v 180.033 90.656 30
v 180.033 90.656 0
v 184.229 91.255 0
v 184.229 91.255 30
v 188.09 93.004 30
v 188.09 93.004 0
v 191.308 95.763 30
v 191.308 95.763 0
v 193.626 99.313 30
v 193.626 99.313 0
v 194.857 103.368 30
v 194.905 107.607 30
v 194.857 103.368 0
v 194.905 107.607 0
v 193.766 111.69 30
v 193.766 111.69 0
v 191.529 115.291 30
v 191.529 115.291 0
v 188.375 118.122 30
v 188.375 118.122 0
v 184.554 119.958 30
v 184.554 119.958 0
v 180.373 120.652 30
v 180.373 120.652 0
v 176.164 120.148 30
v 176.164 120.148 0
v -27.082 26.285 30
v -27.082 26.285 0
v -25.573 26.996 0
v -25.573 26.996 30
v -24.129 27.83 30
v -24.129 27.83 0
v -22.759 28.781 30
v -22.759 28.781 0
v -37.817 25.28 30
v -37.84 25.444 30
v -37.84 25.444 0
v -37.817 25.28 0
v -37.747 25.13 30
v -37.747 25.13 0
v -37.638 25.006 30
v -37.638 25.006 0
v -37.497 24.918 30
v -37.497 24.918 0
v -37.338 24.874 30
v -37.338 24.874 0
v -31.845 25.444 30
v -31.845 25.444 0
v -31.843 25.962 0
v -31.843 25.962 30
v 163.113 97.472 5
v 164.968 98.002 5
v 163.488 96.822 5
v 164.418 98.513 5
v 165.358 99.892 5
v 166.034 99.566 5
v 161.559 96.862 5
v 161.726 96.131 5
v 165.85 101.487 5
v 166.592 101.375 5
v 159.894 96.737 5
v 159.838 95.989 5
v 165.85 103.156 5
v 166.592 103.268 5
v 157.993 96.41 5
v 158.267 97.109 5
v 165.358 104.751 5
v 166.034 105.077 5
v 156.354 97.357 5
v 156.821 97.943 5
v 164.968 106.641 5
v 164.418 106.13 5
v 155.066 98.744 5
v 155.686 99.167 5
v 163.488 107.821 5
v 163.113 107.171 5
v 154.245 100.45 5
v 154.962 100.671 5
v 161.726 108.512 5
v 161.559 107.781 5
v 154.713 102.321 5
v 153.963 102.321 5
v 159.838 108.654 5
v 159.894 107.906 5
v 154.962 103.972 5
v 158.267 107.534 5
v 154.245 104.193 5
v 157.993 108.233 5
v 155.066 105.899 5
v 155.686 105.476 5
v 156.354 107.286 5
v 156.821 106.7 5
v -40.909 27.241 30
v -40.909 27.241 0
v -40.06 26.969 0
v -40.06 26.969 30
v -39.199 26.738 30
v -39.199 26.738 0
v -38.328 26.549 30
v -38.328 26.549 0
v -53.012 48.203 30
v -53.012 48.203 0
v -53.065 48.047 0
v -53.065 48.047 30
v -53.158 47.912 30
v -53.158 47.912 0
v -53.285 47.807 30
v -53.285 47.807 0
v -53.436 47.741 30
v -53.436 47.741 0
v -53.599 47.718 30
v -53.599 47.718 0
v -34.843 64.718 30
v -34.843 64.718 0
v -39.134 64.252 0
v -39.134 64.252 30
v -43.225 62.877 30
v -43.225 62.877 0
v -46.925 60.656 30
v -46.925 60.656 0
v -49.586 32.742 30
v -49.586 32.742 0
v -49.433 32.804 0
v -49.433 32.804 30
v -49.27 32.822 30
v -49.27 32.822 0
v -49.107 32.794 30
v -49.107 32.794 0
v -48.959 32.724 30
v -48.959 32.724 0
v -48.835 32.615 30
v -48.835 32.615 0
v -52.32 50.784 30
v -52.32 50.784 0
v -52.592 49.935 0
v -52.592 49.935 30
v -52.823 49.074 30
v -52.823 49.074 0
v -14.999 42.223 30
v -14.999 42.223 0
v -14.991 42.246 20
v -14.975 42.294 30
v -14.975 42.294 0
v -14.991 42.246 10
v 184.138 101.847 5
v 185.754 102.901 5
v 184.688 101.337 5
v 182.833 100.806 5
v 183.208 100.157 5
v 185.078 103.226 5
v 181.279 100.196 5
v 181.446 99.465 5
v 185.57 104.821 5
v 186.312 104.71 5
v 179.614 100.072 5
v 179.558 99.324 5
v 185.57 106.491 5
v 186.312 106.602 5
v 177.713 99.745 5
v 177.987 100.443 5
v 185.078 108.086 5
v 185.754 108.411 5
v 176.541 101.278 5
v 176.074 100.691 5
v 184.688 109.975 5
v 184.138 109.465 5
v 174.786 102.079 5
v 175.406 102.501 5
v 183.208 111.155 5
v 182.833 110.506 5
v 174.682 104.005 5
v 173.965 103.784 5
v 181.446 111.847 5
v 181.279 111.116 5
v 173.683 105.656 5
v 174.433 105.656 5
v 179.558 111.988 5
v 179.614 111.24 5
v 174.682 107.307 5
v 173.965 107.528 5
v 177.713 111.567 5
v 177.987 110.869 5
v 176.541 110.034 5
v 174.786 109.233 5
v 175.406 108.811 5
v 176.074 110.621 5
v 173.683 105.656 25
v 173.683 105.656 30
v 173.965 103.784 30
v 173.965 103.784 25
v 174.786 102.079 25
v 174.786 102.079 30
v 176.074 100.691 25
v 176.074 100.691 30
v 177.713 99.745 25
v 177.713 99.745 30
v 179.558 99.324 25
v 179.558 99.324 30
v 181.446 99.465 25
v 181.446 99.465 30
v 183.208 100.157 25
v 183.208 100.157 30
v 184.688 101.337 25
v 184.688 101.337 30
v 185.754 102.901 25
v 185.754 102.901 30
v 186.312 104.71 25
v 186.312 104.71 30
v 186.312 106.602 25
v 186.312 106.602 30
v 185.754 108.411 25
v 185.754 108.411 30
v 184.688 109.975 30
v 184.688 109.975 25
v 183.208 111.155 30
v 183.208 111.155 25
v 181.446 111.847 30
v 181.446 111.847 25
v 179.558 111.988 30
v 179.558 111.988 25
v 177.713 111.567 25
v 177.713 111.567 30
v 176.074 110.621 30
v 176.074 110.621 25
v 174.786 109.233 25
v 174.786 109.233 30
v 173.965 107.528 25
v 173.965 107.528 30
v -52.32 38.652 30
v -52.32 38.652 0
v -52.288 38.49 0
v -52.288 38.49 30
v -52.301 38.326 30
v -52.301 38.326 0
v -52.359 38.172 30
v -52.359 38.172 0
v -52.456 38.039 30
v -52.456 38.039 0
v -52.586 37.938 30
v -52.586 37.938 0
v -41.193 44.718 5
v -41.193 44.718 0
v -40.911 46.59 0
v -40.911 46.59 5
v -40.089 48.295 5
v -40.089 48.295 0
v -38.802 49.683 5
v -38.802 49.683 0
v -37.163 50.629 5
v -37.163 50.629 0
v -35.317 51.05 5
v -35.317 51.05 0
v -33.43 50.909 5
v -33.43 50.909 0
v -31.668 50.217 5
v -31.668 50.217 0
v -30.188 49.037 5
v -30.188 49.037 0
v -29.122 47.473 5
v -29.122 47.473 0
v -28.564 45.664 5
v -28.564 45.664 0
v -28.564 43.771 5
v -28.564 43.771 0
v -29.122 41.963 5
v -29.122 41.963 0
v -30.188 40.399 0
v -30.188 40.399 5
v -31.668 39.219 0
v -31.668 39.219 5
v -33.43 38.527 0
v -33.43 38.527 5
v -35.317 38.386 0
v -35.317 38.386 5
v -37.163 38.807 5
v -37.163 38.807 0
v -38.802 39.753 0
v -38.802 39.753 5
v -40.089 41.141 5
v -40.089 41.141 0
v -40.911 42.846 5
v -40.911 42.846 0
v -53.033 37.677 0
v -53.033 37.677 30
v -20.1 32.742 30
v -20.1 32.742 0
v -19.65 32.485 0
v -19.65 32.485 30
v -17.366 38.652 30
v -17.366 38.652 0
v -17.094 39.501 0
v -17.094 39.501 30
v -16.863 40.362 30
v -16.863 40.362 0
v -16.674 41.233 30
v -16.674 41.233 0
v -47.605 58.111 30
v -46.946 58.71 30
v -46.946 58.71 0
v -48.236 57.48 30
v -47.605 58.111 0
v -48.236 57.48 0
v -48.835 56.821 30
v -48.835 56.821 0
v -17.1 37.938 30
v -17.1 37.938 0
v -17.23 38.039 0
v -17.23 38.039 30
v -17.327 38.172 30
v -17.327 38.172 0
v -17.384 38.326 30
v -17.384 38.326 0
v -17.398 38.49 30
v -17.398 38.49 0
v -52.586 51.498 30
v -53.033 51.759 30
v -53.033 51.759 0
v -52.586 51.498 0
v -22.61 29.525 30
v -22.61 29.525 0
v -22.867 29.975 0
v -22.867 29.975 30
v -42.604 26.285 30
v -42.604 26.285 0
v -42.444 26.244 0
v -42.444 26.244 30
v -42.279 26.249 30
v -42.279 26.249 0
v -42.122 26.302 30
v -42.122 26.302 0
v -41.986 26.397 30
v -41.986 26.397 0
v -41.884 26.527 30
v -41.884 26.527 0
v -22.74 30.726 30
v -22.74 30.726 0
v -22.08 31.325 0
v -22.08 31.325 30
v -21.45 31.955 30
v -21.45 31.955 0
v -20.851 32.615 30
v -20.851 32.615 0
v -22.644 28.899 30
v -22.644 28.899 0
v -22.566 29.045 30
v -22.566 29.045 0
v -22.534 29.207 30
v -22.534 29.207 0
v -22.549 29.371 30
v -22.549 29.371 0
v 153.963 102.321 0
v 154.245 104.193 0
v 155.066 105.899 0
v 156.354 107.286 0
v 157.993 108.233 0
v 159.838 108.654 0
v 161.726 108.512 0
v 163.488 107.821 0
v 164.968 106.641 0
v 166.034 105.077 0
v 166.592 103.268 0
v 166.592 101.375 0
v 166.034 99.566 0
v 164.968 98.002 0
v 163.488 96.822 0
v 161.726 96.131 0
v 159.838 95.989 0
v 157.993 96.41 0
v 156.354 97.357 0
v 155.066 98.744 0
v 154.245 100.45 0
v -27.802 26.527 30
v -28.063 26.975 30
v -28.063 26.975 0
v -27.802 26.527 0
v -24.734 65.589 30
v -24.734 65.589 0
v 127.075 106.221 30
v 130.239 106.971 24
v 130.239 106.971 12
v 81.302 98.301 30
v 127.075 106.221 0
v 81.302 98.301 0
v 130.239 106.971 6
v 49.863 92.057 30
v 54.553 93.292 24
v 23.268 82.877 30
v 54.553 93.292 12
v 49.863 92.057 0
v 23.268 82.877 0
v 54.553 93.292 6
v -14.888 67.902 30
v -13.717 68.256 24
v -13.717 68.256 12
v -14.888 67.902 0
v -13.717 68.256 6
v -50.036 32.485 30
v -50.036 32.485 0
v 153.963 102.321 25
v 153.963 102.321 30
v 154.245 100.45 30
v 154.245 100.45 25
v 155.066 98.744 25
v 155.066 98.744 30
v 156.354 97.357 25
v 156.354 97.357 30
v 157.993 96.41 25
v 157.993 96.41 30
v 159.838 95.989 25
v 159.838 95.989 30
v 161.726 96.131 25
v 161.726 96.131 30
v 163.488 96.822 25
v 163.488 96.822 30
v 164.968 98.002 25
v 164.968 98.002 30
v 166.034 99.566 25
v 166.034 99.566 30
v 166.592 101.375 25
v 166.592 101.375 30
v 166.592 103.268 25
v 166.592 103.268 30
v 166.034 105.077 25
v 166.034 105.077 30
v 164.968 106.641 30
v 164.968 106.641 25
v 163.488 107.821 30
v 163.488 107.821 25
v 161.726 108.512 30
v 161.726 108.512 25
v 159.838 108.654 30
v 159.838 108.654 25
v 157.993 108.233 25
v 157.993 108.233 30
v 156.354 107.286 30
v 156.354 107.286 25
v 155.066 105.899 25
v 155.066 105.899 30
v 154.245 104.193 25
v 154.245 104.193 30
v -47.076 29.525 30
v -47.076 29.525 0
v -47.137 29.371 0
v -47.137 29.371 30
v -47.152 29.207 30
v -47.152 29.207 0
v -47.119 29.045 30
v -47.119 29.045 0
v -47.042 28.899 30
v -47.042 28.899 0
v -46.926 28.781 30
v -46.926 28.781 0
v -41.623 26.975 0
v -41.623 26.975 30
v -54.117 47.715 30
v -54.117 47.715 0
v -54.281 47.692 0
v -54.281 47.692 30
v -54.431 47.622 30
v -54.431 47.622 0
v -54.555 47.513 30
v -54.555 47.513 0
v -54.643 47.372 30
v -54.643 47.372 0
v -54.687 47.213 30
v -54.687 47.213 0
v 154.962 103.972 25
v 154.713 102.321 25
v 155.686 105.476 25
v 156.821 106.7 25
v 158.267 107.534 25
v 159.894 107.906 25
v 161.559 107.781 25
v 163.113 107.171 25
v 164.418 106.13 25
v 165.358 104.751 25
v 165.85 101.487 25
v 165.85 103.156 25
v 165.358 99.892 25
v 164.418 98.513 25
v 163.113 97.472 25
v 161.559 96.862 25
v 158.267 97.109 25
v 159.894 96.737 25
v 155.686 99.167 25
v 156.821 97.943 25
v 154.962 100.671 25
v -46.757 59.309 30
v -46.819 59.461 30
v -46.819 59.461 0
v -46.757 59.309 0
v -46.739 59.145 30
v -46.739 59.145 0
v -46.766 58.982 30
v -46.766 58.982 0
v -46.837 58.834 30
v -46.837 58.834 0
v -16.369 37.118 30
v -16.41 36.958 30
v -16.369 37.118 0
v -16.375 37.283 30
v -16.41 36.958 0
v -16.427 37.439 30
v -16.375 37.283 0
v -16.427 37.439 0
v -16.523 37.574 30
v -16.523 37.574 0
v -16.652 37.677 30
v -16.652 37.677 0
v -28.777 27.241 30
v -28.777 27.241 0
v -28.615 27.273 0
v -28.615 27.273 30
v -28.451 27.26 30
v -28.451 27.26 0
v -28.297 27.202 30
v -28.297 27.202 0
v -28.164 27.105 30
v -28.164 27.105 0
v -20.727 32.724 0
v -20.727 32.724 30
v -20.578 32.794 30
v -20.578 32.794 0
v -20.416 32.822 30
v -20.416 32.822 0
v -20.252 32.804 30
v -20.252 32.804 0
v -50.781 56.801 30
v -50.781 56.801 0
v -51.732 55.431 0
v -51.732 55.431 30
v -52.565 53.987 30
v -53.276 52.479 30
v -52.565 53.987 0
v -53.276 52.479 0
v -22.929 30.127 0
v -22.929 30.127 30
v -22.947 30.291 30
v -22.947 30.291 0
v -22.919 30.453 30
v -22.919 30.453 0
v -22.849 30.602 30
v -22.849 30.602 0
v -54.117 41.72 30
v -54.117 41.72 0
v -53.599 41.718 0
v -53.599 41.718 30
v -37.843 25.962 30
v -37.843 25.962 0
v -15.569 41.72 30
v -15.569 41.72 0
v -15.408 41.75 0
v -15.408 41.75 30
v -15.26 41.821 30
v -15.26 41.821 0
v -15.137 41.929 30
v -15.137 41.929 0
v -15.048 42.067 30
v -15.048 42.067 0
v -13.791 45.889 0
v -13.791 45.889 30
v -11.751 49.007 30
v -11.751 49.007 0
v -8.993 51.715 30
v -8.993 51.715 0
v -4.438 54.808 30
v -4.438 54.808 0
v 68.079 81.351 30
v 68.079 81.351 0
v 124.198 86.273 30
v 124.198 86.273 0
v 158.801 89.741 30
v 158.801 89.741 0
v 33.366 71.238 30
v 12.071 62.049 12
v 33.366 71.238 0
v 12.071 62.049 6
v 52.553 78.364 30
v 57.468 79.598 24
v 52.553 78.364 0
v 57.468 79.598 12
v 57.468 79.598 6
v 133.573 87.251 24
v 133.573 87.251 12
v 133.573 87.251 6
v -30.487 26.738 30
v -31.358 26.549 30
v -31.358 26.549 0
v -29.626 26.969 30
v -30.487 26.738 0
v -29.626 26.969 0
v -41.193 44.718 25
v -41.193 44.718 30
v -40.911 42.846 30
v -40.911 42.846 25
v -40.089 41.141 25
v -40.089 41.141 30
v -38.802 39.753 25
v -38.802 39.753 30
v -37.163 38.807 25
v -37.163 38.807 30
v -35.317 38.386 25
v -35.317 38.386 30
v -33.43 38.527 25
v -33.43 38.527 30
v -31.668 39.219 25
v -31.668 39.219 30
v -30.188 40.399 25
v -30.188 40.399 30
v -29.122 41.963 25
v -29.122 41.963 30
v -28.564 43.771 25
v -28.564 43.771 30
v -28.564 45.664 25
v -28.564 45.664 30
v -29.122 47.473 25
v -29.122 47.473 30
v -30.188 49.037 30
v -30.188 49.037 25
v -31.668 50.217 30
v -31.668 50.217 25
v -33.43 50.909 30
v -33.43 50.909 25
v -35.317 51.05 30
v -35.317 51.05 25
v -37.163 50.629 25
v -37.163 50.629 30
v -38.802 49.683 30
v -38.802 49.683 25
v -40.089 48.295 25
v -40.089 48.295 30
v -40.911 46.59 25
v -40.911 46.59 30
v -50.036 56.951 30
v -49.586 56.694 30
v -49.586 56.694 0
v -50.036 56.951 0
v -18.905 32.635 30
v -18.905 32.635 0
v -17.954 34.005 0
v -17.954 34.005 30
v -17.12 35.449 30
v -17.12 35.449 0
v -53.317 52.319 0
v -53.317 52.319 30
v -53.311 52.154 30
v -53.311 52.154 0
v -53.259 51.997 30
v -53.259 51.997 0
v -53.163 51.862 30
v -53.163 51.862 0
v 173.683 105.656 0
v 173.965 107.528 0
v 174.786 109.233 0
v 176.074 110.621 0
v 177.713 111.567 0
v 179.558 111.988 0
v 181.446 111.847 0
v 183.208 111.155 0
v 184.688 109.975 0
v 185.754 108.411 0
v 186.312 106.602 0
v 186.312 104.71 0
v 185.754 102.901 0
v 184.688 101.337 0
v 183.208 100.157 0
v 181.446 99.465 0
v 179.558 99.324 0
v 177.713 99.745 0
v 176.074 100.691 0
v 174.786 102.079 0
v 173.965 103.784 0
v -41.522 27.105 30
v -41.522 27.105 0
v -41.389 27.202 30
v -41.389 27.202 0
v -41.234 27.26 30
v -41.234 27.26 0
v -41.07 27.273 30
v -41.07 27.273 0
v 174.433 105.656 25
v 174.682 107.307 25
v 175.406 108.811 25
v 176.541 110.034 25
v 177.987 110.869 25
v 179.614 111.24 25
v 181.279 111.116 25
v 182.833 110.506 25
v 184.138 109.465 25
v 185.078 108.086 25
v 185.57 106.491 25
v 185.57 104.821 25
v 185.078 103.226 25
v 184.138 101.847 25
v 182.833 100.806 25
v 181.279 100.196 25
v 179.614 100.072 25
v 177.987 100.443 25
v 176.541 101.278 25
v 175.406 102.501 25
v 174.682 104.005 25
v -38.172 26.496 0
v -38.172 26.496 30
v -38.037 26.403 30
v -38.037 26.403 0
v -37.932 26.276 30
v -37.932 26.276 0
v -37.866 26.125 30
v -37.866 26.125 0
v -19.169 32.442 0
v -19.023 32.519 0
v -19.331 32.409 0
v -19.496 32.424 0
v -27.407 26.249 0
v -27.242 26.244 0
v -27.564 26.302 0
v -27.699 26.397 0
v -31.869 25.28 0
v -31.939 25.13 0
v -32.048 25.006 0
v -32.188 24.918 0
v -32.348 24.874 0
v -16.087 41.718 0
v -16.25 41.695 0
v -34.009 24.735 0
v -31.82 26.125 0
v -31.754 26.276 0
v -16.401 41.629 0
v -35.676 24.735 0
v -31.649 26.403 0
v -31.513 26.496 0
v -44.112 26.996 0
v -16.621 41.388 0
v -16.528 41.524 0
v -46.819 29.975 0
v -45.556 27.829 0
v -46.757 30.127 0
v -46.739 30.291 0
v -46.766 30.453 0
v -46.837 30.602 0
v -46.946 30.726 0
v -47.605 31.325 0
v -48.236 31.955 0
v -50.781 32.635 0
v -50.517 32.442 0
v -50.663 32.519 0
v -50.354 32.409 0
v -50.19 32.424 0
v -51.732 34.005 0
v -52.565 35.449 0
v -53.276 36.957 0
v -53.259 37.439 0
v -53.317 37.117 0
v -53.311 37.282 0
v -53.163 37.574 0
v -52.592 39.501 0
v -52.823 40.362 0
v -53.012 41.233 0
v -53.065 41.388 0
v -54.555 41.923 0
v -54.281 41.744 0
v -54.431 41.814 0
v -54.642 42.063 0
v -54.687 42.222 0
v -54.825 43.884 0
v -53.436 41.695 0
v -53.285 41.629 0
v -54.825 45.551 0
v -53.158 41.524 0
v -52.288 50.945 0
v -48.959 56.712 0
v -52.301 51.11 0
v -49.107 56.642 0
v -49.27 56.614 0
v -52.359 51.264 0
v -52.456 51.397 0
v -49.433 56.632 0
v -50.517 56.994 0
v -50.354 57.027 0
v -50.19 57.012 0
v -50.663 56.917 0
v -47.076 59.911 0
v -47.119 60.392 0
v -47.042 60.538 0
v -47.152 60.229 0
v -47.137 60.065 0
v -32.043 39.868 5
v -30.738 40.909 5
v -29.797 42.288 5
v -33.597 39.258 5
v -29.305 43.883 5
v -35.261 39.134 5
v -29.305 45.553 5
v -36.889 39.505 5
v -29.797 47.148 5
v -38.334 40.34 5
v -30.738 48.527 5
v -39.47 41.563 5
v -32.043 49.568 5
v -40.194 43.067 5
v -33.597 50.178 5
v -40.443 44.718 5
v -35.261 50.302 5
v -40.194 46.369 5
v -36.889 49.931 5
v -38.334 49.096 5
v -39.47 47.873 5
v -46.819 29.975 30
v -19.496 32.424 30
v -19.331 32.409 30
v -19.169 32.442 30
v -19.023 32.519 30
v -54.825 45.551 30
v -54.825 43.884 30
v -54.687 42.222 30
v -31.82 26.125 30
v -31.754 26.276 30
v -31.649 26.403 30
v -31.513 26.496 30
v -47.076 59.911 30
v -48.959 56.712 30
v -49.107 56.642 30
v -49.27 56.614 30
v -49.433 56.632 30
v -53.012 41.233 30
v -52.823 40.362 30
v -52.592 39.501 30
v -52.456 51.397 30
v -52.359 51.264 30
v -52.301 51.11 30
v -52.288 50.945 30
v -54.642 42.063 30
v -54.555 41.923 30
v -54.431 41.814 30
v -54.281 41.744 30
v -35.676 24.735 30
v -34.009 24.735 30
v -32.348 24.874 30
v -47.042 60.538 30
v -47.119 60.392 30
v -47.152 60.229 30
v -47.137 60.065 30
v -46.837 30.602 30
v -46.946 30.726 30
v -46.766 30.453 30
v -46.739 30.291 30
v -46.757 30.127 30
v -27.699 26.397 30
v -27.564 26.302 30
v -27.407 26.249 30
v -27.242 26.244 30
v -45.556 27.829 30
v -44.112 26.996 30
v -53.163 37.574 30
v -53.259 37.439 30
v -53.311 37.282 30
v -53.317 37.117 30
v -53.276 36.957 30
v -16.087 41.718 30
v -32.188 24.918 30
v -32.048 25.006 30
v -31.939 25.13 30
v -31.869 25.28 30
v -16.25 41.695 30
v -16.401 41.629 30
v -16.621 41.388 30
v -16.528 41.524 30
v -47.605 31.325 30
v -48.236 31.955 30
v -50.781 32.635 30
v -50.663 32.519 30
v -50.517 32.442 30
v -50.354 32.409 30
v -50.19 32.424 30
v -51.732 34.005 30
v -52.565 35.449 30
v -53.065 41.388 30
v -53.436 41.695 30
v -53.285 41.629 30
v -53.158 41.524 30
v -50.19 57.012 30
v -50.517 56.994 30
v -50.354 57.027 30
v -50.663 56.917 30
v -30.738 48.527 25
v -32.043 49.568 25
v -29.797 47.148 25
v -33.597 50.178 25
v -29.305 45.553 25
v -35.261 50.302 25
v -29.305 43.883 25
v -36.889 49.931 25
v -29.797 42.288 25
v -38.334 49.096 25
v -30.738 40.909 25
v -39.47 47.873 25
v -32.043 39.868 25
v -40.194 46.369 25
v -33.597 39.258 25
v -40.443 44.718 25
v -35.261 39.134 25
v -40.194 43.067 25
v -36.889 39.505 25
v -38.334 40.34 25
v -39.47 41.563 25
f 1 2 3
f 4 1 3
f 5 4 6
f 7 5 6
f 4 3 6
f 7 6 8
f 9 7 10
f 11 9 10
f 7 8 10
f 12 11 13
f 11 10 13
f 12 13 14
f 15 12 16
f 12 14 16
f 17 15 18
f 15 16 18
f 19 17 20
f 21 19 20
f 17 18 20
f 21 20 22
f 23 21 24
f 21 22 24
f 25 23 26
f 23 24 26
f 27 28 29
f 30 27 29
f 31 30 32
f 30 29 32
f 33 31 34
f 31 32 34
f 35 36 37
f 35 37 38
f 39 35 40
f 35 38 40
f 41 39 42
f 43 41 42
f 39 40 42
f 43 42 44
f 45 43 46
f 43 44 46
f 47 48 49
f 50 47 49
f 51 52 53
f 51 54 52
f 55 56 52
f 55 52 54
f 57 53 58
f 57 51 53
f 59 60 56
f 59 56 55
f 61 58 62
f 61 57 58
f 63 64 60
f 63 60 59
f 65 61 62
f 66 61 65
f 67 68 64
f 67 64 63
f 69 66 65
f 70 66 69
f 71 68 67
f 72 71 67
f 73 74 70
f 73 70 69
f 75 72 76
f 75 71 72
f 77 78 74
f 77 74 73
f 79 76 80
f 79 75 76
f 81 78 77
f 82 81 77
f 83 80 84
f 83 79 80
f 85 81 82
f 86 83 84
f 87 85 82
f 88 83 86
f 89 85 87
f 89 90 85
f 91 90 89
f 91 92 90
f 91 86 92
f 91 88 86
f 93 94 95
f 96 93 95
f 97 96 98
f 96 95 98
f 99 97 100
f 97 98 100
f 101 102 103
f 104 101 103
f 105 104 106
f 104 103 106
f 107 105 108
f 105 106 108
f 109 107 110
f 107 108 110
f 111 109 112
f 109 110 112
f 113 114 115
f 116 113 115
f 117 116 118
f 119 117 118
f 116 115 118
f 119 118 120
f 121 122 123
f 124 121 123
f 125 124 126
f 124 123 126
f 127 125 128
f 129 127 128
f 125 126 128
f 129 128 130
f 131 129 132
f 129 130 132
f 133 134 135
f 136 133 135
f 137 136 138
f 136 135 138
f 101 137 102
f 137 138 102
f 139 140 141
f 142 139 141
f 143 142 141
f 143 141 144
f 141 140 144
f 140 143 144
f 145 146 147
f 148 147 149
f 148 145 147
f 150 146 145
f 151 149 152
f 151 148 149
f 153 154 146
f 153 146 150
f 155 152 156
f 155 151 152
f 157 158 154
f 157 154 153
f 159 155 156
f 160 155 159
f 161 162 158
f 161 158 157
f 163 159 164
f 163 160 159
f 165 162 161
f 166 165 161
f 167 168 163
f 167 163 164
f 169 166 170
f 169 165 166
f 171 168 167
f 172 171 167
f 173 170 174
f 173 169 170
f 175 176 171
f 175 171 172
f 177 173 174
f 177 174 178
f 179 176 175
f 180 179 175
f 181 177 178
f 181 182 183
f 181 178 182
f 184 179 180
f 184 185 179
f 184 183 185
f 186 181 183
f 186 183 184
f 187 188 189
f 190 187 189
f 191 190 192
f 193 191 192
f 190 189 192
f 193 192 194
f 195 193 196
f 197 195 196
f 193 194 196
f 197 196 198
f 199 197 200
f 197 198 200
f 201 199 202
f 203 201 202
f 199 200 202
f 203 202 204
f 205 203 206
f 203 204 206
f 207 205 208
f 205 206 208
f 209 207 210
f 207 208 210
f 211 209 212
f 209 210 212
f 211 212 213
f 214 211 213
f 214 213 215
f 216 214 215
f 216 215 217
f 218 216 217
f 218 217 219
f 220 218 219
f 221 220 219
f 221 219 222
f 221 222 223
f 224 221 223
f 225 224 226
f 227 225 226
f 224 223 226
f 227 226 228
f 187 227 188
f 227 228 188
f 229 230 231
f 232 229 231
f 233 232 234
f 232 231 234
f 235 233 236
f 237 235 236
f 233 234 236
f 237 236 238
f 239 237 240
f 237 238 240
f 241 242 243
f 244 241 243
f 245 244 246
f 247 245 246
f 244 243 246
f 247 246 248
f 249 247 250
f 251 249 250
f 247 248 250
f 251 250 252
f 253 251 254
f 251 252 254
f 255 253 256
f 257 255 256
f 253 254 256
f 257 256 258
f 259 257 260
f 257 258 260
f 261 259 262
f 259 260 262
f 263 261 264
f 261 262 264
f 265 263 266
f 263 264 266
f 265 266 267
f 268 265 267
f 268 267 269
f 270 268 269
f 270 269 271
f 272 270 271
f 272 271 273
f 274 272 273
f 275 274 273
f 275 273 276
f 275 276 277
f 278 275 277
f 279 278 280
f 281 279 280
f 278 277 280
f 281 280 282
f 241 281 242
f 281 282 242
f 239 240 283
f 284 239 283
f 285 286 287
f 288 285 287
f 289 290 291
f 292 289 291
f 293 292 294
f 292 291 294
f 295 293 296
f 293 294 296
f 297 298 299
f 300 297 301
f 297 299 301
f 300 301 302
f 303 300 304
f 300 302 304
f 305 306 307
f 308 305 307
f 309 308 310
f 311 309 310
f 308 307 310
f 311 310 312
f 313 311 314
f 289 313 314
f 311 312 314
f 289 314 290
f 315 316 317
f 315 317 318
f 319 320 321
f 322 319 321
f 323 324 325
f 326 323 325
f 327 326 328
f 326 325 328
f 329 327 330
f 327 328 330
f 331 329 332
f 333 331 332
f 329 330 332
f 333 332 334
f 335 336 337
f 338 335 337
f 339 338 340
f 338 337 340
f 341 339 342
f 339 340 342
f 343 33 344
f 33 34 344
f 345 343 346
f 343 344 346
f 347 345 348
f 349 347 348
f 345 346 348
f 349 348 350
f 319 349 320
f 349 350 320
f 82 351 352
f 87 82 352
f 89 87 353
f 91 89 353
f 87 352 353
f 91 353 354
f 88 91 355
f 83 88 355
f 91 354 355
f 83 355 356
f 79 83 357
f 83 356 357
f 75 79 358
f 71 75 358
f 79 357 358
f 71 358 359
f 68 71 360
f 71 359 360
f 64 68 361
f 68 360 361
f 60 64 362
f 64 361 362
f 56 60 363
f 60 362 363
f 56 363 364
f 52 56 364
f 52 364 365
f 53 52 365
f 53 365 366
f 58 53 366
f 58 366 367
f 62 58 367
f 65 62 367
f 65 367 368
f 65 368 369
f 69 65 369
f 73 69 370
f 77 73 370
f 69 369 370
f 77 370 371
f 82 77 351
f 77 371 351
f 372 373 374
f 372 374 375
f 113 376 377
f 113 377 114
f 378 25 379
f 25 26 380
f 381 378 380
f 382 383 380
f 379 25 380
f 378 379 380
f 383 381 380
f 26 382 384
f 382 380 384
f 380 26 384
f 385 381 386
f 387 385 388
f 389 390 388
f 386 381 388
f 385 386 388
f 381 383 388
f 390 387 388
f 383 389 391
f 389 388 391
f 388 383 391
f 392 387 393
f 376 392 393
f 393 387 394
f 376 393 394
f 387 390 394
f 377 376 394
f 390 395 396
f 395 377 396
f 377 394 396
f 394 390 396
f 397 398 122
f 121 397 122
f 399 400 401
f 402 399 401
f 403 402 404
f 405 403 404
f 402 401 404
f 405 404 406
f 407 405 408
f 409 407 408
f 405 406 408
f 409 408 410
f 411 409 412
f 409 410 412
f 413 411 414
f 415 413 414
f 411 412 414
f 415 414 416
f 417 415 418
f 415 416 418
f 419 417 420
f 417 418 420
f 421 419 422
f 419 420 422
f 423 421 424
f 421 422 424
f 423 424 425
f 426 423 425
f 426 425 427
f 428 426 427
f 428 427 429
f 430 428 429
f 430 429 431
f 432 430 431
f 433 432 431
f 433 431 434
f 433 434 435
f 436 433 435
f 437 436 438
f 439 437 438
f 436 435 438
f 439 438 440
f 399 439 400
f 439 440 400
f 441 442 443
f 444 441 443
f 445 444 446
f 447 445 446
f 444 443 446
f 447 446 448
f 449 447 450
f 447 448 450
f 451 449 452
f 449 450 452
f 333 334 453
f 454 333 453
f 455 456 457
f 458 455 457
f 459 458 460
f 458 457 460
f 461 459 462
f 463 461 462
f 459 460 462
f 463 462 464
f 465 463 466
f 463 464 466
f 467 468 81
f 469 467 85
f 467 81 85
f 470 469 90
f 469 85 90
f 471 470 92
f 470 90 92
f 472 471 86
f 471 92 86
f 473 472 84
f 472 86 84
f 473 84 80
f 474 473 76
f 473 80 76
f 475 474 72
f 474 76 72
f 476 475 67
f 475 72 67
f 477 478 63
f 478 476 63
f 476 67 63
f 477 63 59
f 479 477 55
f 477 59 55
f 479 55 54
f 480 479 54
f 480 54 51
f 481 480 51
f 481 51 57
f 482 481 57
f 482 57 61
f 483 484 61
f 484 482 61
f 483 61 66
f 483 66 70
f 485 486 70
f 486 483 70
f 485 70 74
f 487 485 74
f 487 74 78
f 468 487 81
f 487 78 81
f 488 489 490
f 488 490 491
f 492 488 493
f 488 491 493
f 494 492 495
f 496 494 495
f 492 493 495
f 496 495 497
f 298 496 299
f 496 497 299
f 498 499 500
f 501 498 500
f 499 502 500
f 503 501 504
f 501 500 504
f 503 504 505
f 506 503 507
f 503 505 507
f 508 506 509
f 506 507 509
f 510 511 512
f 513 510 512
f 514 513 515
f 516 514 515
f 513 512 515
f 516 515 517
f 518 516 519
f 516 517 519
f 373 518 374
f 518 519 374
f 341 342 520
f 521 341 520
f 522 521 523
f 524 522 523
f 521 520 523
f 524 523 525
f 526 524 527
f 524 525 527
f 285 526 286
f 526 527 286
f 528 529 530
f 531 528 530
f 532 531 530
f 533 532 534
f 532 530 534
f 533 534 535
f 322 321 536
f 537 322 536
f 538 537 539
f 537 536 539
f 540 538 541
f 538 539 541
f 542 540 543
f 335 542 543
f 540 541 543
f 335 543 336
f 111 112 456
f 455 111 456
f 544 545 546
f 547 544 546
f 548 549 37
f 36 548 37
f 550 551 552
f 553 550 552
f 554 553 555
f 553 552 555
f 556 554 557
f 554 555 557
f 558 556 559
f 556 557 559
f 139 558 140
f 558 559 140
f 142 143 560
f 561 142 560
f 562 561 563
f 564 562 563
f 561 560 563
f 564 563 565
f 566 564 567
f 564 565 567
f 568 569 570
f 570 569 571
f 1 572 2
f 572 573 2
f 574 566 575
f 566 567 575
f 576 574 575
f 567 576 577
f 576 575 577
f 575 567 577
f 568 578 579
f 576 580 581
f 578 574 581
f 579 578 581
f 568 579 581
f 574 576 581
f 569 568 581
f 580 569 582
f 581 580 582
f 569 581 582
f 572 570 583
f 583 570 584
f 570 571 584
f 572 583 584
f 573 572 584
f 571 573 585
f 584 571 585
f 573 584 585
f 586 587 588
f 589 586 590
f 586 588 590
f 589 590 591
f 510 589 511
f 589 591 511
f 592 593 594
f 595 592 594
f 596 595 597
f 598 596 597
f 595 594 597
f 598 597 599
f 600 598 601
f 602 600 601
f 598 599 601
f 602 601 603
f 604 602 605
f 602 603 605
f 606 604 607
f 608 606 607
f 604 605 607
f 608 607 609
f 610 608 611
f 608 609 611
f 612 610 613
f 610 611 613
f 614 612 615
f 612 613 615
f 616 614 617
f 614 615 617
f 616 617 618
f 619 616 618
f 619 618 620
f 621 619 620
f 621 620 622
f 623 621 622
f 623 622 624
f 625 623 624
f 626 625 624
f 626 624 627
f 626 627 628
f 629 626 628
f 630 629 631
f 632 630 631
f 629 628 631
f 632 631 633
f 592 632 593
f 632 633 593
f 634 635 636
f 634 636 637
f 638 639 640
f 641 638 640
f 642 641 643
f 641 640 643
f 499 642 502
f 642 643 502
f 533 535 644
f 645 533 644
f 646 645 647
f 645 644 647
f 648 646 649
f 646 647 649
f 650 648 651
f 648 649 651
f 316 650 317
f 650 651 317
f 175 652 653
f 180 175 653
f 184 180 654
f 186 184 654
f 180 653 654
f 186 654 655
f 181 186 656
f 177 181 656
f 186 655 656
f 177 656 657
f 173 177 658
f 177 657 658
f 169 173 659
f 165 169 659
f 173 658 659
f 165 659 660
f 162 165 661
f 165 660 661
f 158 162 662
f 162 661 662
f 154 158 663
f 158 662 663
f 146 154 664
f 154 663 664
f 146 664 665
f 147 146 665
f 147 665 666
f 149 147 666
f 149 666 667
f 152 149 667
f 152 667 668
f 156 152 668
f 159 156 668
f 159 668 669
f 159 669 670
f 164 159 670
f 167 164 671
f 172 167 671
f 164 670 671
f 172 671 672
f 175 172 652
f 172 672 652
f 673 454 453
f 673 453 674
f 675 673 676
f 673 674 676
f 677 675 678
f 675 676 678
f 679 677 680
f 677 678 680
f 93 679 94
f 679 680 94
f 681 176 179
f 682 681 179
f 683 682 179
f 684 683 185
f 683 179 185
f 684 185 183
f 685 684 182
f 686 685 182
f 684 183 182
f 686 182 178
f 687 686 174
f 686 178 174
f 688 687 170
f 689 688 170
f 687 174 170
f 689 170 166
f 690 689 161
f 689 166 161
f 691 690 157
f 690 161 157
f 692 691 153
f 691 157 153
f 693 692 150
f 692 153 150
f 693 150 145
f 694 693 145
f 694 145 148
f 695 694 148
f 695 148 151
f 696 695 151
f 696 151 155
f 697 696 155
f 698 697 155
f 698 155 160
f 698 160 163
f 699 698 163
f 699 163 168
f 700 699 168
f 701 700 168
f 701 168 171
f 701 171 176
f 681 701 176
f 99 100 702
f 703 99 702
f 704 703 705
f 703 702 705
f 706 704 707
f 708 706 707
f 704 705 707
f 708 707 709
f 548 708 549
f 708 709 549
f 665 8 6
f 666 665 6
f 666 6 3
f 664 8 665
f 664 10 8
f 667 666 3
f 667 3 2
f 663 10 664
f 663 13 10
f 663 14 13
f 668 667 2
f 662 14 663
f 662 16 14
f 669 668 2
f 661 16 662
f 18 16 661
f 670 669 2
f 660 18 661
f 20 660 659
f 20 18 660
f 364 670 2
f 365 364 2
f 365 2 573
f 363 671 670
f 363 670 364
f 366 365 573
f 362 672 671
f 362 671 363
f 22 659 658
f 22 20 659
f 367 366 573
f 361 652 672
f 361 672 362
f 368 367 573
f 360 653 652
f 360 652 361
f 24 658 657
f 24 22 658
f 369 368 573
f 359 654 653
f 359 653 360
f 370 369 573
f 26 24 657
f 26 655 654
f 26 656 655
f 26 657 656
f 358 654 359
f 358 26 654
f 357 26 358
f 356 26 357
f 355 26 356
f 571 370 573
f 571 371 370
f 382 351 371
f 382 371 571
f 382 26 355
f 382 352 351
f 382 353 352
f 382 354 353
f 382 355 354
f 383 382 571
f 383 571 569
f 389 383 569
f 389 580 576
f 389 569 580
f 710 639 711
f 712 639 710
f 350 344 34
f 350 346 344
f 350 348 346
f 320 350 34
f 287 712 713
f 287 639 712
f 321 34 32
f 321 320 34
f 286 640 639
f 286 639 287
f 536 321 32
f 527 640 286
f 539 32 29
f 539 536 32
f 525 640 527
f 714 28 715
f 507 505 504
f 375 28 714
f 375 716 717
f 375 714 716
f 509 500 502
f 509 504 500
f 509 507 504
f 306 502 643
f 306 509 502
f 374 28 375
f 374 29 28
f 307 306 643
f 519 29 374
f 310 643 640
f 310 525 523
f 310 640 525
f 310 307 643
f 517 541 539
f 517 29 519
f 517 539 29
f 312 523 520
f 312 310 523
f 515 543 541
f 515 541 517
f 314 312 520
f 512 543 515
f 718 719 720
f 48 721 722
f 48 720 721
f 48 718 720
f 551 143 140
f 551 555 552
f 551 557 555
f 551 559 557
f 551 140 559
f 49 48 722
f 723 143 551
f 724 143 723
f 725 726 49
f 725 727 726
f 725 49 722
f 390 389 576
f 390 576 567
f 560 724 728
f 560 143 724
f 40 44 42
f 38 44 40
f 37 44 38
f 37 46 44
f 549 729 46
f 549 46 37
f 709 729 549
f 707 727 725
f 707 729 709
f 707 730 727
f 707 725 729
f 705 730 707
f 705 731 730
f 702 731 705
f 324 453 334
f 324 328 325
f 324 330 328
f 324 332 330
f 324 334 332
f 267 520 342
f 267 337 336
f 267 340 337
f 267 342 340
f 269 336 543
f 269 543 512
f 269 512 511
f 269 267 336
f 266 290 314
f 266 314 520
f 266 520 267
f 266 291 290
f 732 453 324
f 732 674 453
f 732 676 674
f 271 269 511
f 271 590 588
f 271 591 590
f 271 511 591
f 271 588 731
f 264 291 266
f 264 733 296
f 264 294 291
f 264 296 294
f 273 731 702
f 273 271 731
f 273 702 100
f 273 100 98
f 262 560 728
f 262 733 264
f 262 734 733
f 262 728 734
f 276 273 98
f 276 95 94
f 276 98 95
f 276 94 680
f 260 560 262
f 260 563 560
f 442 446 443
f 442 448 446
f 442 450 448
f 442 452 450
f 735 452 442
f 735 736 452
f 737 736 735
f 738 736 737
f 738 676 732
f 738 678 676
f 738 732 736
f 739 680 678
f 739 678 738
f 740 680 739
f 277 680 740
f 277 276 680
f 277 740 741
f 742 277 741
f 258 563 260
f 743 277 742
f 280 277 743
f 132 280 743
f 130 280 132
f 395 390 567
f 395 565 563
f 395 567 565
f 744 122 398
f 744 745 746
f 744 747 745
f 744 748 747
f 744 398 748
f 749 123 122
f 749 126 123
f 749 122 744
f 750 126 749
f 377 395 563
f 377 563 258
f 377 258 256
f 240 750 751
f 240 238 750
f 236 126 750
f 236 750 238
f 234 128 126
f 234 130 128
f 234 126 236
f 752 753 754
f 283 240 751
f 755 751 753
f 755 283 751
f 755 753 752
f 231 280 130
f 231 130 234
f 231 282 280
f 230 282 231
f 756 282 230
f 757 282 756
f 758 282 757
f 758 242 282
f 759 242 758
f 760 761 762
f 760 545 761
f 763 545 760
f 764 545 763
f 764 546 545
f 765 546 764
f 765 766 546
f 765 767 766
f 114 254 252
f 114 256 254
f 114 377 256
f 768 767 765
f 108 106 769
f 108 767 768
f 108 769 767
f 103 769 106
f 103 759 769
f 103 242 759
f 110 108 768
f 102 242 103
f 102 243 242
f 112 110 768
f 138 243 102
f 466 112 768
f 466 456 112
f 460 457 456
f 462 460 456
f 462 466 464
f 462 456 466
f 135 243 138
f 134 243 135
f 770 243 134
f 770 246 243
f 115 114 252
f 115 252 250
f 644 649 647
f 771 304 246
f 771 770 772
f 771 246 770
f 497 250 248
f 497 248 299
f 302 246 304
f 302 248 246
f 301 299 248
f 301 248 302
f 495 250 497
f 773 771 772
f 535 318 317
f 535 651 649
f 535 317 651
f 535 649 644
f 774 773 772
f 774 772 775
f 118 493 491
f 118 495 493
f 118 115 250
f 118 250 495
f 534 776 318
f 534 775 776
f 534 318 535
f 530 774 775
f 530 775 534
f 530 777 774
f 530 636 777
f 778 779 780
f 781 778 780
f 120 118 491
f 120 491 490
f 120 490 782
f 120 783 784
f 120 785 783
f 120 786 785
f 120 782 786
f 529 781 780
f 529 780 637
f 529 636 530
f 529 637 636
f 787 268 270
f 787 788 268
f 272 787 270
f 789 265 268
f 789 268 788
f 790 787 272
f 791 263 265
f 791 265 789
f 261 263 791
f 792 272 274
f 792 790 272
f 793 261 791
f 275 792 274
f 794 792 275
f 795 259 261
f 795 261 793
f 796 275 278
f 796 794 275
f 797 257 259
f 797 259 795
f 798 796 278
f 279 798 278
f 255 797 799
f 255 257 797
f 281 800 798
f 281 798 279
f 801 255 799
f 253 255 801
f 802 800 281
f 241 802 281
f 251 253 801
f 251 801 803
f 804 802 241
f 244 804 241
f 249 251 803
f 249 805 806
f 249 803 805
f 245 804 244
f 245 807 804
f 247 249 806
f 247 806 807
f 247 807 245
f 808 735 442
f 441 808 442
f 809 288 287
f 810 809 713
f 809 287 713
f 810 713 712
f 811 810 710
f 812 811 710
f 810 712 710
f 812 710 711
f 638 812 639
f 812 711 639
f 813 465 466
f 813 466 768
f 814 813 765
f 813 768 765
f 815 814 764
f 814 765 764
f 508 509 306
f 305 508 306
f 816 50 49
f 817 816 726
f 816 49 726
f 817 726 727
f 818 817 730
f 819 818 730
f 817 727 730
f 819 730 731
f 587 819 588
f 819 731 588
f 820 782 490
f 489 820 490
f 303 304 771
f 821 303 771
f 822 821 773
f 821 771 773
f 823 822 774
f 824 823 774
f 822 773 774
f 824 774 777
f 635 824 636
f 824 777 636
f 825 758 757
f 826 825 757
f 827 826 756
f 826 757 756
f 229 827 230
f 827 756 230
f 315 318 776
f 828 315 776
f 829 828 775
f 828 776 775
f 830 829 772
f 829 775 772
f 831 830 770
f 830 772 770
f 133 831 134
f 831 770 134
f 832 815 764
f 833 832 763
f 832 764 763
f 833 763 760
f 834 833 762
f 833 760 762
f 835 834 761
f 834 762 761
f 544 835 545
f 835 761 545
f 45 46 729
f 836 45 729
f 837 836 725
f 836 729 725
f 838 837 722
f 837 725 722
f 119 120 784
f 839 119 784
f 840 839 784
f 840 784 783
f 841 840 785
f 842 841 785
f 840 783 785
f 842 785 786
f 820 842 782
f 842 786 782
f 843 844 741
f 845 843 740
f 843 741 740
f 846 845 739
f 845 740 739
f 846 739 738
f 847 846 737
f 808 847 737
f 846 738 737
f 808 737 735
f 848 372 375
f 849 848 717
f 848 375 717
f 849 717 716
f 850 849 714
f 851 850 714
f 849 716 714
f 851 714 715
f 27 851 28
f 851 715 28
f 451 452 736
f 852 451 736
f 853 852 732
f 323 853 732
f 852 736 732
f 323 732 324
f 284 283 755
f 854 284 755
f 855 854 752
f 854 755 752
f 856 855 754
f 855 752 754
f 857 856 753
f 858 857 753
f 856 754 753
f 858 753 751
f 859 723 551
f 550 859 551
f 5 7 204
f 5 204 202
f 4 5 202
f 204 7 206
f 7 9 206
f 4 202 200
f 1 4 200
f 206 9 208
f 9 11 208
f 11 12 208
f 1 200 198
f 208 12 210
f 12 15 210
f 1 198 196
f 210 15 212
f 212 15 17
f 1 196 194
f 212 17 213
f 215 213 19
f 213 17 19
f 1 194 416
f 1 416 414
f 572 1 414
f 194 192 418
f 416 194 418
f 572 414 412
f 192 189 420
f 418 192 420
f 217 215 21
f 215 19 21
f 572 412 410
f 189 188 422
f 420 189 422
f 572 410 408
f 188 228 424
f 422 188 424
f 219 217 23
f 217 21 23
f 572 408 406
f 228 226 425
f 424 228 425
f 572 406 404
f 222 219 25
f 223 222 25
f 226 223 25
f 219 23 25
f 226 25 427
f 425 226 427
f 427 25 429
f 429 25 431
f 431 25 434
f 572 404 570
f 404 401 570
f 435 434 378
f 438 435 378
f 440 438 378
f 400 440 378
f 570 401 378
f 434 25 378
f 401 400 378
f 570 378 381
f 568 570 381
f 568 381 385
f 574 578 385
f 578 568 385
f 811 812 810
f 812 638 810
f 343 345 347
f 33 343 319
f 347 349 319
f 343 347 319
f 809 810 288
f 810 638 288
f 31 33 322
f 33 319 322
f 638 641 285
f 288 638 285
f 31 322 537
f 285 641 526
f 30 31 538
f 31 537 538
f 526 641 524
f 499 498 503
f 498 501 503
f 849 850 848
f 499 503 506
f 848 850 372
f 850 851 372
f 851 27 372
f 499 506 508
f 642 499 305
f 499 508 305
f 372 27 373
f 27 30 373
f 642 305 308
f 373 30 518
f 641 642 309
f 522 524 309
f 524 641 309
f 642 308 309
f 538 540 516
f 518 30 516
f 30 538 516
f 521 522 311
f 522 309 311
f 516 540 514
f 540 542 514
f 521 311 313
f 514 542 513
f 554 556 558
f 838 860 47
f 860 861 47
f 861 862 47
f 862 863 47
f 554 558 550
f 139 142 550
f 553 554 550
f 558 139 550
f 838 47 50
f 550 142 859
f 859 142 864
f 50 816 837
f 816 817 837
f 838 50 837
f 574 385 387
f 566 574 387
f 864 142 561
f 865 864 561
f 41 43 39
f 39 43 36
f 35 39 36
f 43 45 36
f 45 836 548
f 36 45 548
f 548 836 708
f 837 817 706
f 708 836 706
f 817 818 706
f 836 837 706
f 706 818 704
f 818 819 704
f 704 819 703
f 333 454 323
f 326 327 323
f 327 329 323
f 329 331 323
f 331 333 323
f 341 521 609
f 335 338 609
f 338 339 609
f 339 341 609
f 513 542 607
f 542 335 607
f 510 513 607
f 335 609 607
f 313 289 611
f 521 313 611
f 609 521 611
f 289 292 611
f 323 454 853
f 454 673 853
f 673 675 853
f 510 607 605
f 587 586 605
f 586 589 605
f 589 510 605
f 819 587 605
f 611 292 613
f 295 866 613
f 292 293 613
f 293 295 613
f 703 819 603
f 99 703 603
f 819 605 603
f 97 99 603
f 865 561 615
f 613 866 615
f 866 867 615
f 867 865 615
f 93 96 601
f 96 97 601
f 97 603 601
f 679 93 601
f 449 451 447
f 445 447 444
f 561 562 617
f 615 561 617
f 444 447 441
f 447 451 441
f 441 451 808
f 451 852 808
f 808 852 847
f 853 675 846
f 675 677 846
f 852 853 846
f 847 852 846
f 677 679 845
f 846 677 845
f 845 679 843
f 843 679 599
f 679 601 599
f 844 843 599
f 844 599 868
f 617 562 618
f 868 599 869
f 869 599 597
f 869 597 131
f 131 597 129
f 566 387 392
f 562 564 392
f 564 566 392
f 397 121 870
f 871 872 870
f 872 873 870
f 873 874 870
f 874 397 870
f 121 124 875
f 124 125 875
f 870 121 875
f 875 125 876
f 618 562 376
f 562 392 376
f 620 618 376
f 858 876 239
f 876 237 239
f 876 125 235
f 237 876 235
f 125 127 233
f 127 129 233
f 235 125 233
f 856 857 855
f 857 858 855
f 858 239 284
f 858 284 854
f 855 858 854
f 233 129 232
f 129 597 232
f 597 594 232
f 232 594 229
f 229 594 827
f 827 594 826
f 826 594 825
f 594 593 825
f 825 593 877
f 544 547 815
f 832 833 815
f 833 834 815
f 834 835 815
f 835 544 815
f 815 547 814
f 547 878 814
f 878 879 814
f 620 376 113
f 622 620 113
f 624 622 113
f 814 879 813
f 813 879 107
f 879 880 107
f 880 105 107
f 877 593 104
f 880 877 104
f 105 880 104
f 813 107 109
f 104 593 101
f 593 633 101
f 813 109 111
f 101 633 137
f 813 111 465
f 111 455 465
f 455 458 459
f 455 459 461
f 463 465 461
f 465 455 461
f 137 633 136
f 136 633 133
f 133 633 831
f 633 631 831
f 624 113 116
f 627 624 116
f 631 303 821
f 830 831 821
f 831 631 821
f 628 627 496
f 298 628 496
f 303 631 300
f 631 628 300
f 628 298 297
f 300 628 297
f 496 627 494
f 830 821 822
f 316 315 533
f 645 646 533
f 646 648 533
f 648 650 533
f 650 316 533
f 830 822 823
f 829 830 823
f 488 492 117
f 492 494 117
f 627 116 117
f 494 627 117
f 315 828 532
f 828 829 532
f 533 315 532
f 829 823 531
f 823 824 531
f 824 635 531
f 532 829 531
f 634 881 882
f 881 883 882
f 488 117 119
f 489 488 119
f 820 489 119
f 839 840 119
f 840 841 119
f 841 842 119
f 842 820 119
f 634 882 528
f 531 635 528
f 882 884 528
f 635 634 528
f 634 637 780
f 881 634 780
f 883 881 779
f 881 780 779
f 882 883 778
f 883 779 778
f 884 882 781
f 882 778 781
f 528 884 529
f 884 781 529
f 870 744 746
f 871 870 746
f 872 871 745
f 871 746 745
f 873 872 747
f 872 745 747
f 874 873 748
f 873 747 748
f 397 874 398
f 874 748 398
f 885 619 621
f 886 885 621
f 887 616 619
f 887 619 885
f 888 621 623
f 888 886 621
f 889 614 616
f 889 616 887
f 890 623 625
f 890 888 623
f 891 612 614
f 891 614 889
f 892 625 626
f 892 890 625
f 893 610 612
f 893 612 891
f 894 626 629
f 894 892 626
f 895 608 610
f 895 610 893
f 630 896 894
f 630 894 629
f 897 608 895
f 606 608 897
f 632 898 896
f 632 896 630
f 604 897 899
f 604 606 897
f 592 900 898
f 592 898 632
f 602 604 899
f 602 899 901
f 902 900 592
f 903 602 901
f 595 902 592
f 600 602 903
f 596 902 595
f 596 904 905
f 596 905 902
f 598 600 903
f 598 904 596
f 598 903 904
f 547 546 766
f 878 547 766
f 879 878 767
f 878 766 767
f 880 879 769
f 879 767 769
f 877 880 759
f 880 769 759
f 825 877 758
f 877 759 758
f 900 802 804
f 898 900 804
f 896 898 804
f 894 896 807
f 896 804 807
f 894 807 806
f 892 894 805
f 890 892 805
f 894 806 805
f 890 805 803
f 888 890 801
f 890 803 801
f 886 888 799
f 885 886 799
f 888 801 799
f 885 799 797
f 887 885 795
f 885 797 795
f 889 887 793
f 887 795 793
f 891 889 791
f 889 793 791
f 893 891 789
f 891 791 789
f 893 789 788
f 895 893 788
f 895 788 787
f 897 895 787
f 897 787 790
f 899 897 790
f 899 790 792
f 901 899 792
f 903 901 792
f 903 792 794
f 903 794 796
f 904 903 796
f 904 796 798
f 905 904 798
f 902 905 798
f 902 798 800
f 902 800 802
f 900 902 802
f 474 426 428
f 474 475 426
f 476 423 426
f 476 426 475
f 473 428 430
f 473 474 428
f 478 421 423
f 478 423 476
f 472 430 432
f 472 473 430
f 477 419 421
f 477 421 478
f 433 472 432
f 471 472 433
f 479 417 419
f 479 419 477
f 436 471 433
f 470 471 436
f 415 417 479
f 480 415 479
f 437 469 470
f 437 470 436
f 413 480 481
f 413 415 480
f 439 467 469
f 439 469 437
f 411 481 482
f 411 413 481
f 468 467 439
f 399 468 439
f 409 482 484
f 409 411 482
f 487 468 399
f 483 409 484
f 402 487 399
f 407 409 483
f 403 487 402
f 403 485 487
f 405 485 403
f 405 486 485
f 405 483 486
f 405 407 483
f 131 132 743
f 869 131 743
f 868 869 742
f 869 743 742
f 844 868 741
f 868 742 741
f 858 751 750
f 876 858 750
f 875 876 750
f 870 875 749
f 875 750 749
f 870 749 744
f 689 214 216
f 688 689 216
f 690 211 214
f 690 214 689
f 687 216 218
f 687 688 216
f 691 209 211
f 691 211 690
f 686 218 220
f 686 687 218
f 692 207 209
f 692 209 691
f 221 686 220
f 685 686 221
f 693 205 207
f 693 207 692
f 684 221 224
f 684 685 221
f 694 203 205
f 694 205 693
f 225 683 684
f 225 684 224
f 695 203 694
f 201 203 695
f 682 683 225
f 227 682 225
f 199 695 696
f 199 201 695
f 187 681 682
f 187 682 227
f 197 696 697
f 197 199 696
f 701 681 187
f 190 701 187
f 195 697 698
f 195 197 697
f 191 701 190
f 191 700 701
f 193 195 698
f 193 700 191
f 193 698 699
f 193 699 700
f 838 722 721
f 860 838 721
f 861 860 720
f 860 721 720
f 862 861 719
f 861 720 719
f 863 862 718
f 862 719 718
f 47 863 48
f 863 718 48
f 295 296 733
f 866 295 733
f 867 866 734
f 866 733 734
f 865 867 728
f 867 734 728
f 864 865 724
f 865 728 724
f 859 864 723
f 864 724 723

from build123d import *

# Parameters (mm, degrees)
CROQUIS2_R              = 6.35
SALIENTE_EXTRUIR1_DEPTH = 30
CROQUIS5_R              = 7.443338
CROQUIS5_R_2            = 2.5
CROQUIS5_R_3            = 7.334997
SALIENTE_EXTRUIR4_DEPTH = 30
CROQUIS6_R              = 6.35
CORTAR_EXTRUIR2_DEPTH   = 5
CROQUIS7_R              = 5.6
CORTAR_EXTRUIR3_DEPTH   = 30
CROQUIS8_R              = 6.35
CROQUIS8_R_2            = 5.6
CORTAR_EXTRUIR4_DEPTH   = 5
CROQUIS9_R              = 5.6
CORTAR_EXTRUIR6_DEPTH   = 30
CROQUIS10_R             = 6.35
CORTAR_EXTRUIR7_DEPTH   = 5
CROQUIS11_R             = 6.35
CORTAR_EXTRUIR8_DEPTH   = 5
CROQUIS14_R             = 6.35
CROQUIS14_R_2           = 5.6
SALIENTE_EXTRUIR5_DEPTH = 30
CROQUIS15_R             = 6.35
CORTAR_EXTRUIR9_DEPTH   = 5
CROQUIS16_R             = 6.35
CORTAR_EXTRUIR10_DEPTH  = 5
CORTAR_EXTRUIR11_DEPTH  = 30
CORTAR_EXTRUIR12_DEPTH  = 30


with BuildPart() as part:
    # Croquis2 → Saliente-Extruir1 (new body)
    with BuildSketch(Plane.XY):
        with BuildLine():
            ThreePointArc((180.032921, 90.655997), (194.905493, 107.607048), (176.163968, 120.14845))
            add(Edge.make_bspline(
                [(176.163968, 120.14845), (160.644333, 116.005277), (131.164286, 105.63785), (89.902158, 99.637145), (47.577901, 93.169368), (9.263632, 77.144895), (-20.334547, 64.717915), (-34.842858, 64.717915)],
                knots=[0, 0, 0, 0, 0.21855, 0.429652, 0.570361, 0.803751, 1, 1, 1, 1], degree=3))
            ThreePointArc((-34.842858, 64.717915), (-49.983575, 31.650448), (-15.057777, 41.793784))
            add(Edge.make_bspline(
                [(-15.057777, 41.793784), (-13.422876, 52.855749), (19.931915, 63.726677), (50.067366, 80.671919), (92.860268, 83.147923), (133.388153, 87.091721), (164.275892, 90.655997), (180.032921, 90.655997)],
                knots=[0, 0, 0, 0, 0.164668, 0.401388, 0.54424, 0.773428, 1, 1, 1, 1], degree=3))
        make_face()
        with Locations((160.312855, 102.321484)):
            Circle(CROQUIS2_R, mode=Mode.SUBTRACT)
        with Locations((180.032921, 105.655997)):
            Circle(CROQUIS2_R, mode=Mode.SUBTRACT)
        with Locations((-34.842858, 44.717915)):
            Circle(CROQUIS2_R, mode=Mode.SUBTRACT)
    extrude(amount=SALIENTE_EXTRUIR1_DEPTH)

    # Croquis5 → Saliente-Extruir4 (add)
    with BuildSketch(Plane(origin=(0, 0, 0), x_dir=(-1, 0, 0), z_dir=(0, 0, -1))):
        with Locations((-180.032921, 105.655997)):
            Circle(CROQUIS5_R)
        with Locations((-180.032921, 105.655997)):
            Circle(CROQUIS5_R_2, mode=Mode.SUBTRACT)
        with Locations((-160.312855, 102.321484)):
            Circle(CROQUIS5_R_3)
        with Locations((-160.312855, 102.321484)):
            Circle(CROQUIS5_R_2, mode=Mode.SUBTRACT)
    extrude(amount=-SALIENTE_EXTRUIR4_DEPTH)

    # Croquis6 → Cortar-Extruir2 (cut)
    with BuildSketch(Plane(origin=(0, 0, 0), x_dir=(-1, 0, 0), z_dir=(0, 0, -1))):
        with Locations((-160.312855, 102.321484)):
            Circle(CROQUIS6_R)
    extrude(amount=-CORTAR_EXTRUIR2_DEPTH, mode=Mode.SUBTRACT)

    # Croquis7 → Cortar-Extruir3 (cut)
    with BuildSketch(Plane(origin=(0, 0, 5), x_dir=(-1, 0, 0), z_dir=(0, 0, -1))):
        with Locations((-160.312855, 102.321484)):
            Circle(CROQUIS7_R)
    extrude(amount=-CORTAR_EXTRUIR3_DEPTH, mode=Mode.SUBTRACT)

    # Croquis8 → Cortar-Extruir4 (cut)
    with BuildSketch(Plane.XY.offset(30)):
        with Locations(Location((160.312855, 102.321484, 0), (0, 0, 180))):
            Circle(CROQUIS8_R)
        with Locations(Location((160.312855, 102.321484, 0), (0, 0, 180))):
            Circle(CROQUIS8_R_2, mode=Mode.SUBTRACT)
    extrude(amount=-CORTAR_EXTRUIR4_DEPTH, mode=Mode.SUBTRACT)

    # Croquis9 → Cortar-Extruir6 (cut)
    with BuildSketch(Plane(origin=(0, 0, 0), x_dir=(-1, 0, 0), z_dir=(0, 0, -1))):
        with Locations((-180.032921, 105.655997)):
            Circle(CROQUIS9_R)
    extrude(amount=-CORTAR_EXTRUIR6_DEPTH, mode=Mode.SUBTRACT)

    # Croquis10 → Cortar-Extruir7 (cut)
    with BuildSketch(Plane(origin=(0, 0, 0), x_dir=(-1, 0, 0), z_dir=(0, 0, -1))):
        with Locations((-180.032921, 105.655997)):
            Circle(CROQUIS10_R)
    extrude(amount=-CORTAR_EXTRUIR7_DEPTH, mode=Mode.SUBTRACT)

    # Croquis11 → Cortar-Extruir8 (cut)
    with BuildSketch(Plane.XY.offset(30)):
        with Locations(Location((180.032921, 105.655997, 0), (0, 0, 180))):
            Circle(CROQUIS11_R)
    extrude(amount=-CORTAR_EXTRUIR8_DEPTH, mode=Mode.SUBTRACT)

    # Croquis14 → Saliente-Extruir5 (add)
    with BuildSketch(Plane(origin=(0, 0, 0), x_dir=(-1, 0, 0), z_dir=(0, 0, -1))):
        with Locations((34.842858, 44.717915)):
            Circle(CROQUIS14_R)
        with Locations((34.842858, 44.717915)):
            Circle(CROQUIS14_R_2, mode=Mode.SUBTRACT)
    extrude(amount=-SALIENTE_EXTRUIR5_DEPTH)

    # Croquis15 → Cortar-Extruir9 (cut)
    with BuildSketch(Plane(origin=(0, 0, 0), x_dir=(-1, 0, 0), z_dir=(0, 0, -1))):
        with Locations((34.842858, 44.717915)):
            Circle(CROQUIS15_R)
    extrude(amount=-CORTAR_EXTRUIR9_DEPTH, mode=Mode.SUBTRACT)

    # Croquis16 → Cortar-Extruir10 (cut)
    with BuildSketch(Plane.XY.offset(30)):
        with Locations(Location((-34.842858, 44.717915, 0), (0, 0, 180))):
            Circle(CROQUIS16_R)
    extrude(amount=-CORTAR_EXTRUIR10_DEPTH, mode=Mode.SUBTRACT)

    # Croquis17 → Cortar-Extruir11 (cut)
    with BuildSketch(Plane(origin=(0, 0, 0), x_dir=(-1, 0, 0), z_dir=(0, 0, -1))):
        with BuildLine():
            Line((37.842858, 25.961909), (37.840378, 25.443819))
            ThreePointArc((37.840378, 25.443819), (37.696791, 25.063997), (37.337849, 24.87415))
            ThreePointArc((37.337849, 24.87415), (40.019239, 25.399398), (42.604016, 26.285215))
            ThreePointArc((42.604016, 26.285215), (42.198239, 26.270156), (41.883978, 26.527298))
            Line((41.883978, 26.527298), (41.622785, 26.974738))
            ThreePointArc((41.622785, 26.974738), (41.313642, 27.236121), (40.908833, 27.240674))
            ThreePointArc((40.908833, 27.240674), (39.631011, 26.848287), (38.328191, 26.549193))
            ThreePointArc((38.328191, 26.549193), (37.979893, 26.342846), (37.842858, 25.961909))
        make_face()
        with BuildLine():
            ThreePointArc((27.081701, 26.285215), (29.666477, 25.399398), (32.347868, 24.87415))
            ThreePointArc((32.347868, 24.87415), (31.988925, 25.063997), (31.845339, 25.443819))
            Line((31.845339, 25.443819), (31.842858, 25.961909))
            ThreePointArc((31.842858, 25.961909), (31.705824, 26.342846), (31.357526, 26.549193))
            ThreePointArc((31.357526, 26.549193), (30.054706, 26.848287), (28.776884, 27.240674))
            ThreePointArc((28.776884, 27.240674), (28.372075, 27.236121), (28.062932, 26.974738))
            Line((28.062932, 26.974738), (27.801738, 26.527298))
            ThreePointArc((27.801738, 26.527298), (27.487478, 26.270156), (27.081701, 26.285215))
        make_face()
        with BuildLine():
            ThreePointArc((47.075834, 29.524818), (47.141396, 29.124089), (46.925466, 28.780205))
            ThreePointArc((46.925466, 28.780205), (48.984994, 30.575779), (50.780568, 32.635307))
            ThreePointArc((50.780568, 32.635307), (50.436684, 32.419378), (50.035955, 32.484939))
            Line((50.035955, 32.484939), (49.586036, 32.741836))
            ThreePointArc((49.586036, 32.741836), (49.187618, 32.813629), (48.834767, 32.615168))
            ThreePointArc((48.834767, 32.615168), (47.924334, 31.636439), (46.945606, 30.726006))
            ThreePointArc((46.945606, 30.726006), (46.747144, 30.373155), (46.818937, 29.974738))
            Line((46.818937, 29.974738), (47.075834, 29.524818))
        make_face()
        with BuildLine():
            ThreePointArc((18.905149, 32.635307), (20.700723, 30.575779), (22.76025, 28.780205))
            ThreePointArc((22.76025, 28.780205), (22.544321, 29.124089), (22.609882, 29.524818))
            Line((22.609882, 29.524818), (22.866779, 29.974738))
            ThreePointArc((22.866779, 29.974738), (22.938572, 30.373155), (22.740111, 30.726006))
            ThreePointArc((22.740111, 30.726006), (21.761383, 31.636439), (20.85095, 32.615168))
            ThreePointArc((20.85095, 32.615168), (20.498099, 32.813629), (20.099681, 32.741836))
            Line((20.099681, 32.741836), (19.649761, 32.484939))
            ThreePointArc((19.649761, 32.484939), (19.249032, 32.419378), (18.905149, 32.635307))
        make_face()
        with BuildLine():
            ThreePointArc((53.033475, 37.676795), (53.290617, 37.362534), (53.275558, 36.956757))
            ThreePointArc((53.275558, 36.956757), (54.161375, 39.541534), (54.686624, 42.222924))
            ThreePointArc((54.686624, 42.222924), (54.496776, 41.863982), (54.116954, 41.720396))
            Line((54.116954, 41.720396), (53.598864, 41.717915))
            ThreePointArc((53.598864, 41.717915), (53.217928, 41.580881), (53.01158, 41.232583))
            ThreePointArc((53.01158, 41.232583), (52.712486, 39.929763), (52.320099, 38.65194))
            ThreePointArc((52.320099, 38.65194), (52.324652, 38.247132), (52.586036, 37.937988))
            Line((52.586036, 37.937988), (53.033475, 37.676795))
        make_face()
        with BuildLine():
            ThreePointArc((15.568762, 41.720396), (15.18894, 41.863982), (14.999093, 42.222924))
            Line((14.999093, 42.222924), (14.987998, 42.221529))
            add(Edge.make_bspline(
                [(15.057777, 41.793784), (15.03654, 41.937475), (15.01327, 42.080052), (14.987998, 42.221529)],
                knots=[0, 0, 0, 0, 0.002139, 0.002139, 0.002139, 0.002139], degree=3))
            ThreePointArc((15.057777, 41.793784), (15.581526, 39.33265), (16.410158, 36.956757))
            ThreePointArc((16.410158, 36.956757), (16.3951, 37.362534), (16.652242, 37.676795))
            Line((16.652242, 37.676795), (17.099681, 37.937988))
            ThreePointArc((17.099681, 37.937988), (17.361064, 38.247132), (17.365617, 38.65194))
            ThreePointArc((17.365617, 38.65194), (16.97323, 39.929763), (16.674136, 41.232583))
            ThreePointArc((16.674136, 41.232583), (16.467789, 41.580881), (16.086853, 41.717915))
            Line((16.086853, 41.717915), (15.568762, 41.720396))
        make_face()
        with BuildLine():
            ThreePointArc((54.116954, 47.715434), (54.496776, 47.571848), (54.686624, 47.212905))
            ThreePointArc((54.686624, 47.212905), (54.161375, 49.894296), (53.275558, 52.479072))
            ThreePointArc((53.275558, 52.479072), (53.290617, 52.073296), (53.033475, 51.759035))
            Line((53.033475, 51.759035), (52.586036, 51.497841))
            ThreePointArc((52.586036, 51.497841), (52.324652, 51.188698), (52.320099, 50.78389))
            ThreePointArc((52.320099, 50.78389), (52.712486, 49.506067), (53.01158, 48.203247))
            ThreePointArc((53.01158, 48.203247), (53.217928, 47.854949), (53.598864, 47.717915))
            Line((53.598864, 47.717915), (54.116954, 47.715434))
        make_face()
        with BuildLine():
            ThreePointArc((50.035955, 56.950891), (50.436684, 57.016452), (50.780568, 56.800523))
            ThreePointArc((50.780568, 56.800523), (48.984994, 58.860051), (46.925466, 60.655625))
            ThreePointArc((46.925466, 60.655625), (47.141396, 60.311741), (47.075834, 59.911012))
            Line((47.075834, 59.911012), (46.818937, 59.461092))
            ThreePointArc((46.818937, 59.461092), (46.747144, 59.062675), (46.945606, 58.709824))
            ThreePointArc((46.945606, 58.709824), (47.924334, 57.79939), (48.834767, 56.820662))
            ThreePointArc((48.834767, 56.820662), (49.187618, 56.622201), (49.586036, 56.693994))
            Line((49.586036, 56.693994), (50.035955, 56.950891))
        make_face()
    extrude(amount=-CORTAR_EXTRUIR11_DEPTH, mode=Mode.SUBTRACT)

    # Croquis19 → Cortar-Extruir12 (cut)
    with BuildSketch(Plane(origin=(0, 0, 0), x_dir=(-1, 0, 0), z_dir=(0, 0, -1))):
        with BuildLine():
            add(Edge.make_bspline(
                [(14.999093, 42.222924), (14.99115, 42.24649), (14.983101, 42.270016), (14.974951, 42.293506)],
                knots=[0, 0, 0, 0, 0.07094, 0.07094, 0.07094, 0.07094], degree=3))
            add(Edge.make_bspline(
                [(14.987998, 42.221529), (14.983706, 42.245553), (14.979357, 42.269545), (14.974951, 42.293506)],
                knots=[0.002139, 0.002139, 0.002139, 0.002139, 0.002502, 0.002502, 0.002502, 0.002502], degree=3))
            Line((14.987998, 42.221529), (14.999093, 42.222924))
        make_face()
        with BuildLine():
            ThreePointArc((15.568762, 41.720396), (15.195128, 41.870996), (14.999093, 42.222924))
            ThreePointArc((14.999093, 42.222924), (15.18894, 41.863982), (15.568762, 41.720396))
        make_face()
    extrude(amount=-CORTAR_EXTRUIR12_DEPTH, mode=Mode.SUBTRACT)


solid = part.part
